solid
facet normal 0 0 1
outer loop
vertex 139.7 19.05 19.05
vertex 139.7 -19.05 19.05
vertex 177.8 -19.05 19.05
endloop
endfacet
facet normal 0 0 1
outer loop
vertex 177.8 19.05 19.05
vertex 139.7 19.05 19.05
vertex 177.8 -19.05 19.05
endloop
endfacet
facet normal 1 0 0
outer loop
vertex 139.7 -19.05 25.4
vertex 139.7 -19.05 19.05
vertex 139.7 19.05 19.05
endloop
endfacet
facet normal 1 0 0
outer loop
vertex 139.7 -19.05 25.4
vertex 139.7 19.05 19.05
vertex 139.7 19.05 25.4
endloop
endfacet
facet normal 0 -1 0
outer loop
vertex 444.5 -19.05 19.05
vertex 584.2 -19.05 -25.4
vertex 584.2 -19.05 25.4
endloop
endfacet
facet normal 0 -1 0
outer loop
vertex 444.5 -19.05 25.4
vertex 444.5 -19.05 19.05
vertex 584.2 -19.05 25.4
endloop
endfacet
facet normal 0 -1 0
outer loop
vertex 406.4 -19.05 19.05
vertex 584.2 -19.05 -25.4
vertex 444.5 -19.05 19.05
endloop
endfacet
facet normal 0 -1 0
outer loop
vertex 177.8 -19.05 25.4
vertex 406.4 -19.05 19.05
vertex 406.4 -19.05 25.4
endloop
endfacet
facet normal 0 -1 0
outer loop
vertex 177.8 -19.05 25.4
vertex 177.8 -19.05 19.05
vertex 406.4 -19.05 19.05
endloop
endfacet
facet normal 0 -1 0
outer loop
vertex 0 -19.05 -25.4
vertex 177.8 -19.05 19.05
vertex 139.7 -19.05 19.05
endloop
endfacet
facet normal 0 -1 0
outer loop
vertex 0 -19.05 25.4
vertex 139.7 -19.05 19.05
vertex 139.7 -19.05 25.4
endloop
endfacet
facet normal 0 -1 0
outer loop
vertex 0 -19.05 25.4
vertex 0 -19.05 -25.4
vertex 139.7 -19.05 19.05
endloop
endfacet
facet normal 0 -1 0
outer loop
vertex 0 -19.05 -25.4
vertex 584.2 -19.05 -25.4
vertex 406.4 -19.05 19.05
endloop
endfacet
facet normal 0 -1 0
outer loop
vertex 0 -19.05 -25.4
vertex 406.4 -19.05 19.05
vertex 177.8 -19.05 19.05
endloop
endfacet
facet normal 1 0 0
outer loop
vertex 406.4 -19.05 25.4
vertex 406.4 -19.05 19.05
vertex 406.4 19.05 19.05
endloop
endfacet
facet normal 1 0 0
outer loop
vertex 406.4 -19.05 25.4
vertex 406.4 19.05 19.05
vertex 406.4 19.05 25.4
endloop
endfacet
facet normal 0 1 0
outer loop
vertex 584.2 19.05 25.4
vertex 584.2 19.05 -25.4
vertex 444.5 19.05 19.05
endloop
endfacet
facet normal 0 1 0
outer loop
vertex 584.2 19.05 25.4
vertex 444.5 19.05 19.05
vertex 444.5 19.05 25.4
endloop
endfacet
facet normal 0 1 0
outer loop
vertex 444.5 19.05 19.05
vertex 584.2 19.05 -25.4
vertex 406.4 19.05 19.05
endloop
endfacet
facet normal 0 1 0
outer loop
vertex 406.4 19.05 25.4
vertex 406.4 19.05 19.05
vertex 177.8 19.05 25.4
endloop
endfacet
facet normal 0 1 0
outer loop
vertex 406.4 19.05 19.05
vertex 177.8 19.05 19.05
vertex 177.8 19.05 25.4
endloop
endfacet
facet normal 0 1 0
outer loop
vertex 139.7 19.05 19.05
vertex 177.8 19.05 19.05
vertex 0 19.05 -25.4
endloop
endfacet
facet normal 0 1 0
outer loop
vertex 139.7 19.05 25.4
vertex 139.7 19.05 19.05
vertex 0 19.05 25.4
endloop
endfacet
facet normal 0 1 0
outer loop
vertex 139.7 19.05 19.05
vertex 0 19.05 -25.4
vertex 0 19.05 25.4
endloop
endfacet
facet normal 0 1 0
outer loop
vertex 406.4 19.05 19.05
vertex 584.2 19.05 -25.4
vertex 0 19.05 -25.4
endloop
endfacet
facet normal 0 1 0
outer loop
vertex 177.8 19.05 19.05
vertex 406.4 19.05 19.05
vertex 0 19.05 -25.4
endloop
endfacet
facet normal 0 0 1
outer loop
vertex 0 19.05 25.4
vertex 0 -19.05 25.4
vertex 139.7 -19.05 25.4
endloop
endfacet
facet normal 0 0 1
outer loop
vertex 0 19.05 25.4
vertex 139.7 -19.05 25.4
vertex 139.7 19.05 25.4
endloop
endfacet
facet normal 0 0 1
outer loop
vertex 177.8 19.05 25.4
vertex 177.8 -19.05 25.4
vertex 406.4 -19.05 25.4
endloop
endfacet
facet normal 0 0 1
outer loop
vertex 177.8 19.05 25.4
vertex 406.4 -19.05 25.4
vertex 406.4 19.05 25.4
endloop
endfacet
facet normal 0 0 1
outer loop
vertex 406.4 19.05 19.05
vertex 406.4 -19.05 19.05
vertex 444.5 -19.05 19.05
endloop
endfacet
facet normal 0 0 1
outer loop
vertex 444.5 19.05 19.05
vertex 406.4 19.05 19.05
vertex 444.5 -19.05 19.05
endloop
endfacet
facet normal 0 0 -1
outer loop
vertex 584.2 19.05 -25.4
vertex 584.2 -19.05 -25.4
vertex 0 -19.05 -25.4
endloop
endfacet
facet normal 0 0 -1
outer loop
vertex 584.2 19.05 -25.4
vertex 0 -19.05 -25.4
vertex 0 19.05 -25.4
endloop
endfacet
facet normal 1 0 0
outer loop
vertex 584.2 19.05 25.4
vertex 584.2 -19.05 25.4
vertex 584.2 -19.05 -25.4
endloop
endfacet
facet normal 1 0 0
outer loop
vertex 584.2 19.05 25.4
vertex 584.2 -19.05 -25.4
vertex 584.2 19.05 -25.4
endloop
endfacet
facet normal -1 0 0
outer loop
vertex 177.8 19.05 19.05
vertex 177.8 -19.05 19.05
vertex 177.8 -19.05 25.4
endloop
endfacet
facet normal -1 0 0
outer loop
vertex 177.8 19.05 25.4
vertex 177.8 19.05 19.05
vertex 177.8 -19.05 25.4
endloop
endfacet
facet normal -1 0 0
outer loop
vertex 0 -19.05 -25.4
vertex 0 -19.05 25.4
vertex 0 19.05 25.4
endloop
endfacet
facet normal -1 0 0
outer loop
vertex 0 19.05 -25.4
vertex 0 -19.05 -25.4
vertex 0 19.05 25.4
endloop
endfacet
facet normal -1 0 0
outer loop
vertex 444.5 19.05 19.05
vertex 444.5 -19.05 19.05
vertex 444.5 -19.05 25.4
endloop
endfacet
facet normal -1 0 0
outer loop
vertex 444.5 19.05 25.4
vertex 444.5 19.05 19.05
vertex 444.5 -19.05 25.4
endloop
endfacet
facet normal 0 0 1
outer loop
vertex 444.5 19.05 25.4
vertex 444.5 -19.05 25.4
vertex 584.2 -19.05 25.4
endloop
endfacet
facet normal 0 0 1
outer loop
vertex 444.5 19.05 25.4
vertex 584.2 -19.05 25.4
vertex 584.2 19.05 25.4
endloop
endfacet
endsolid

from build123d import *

# Parameters (mm, degrees)
F0_W     = 38.1
F0_H     = 50.8
F1_DEPTH = 584.2
F2_W     = 38.1
F2_H     = 6.35
F3_DEPTH = 38.1


with BuildPart() as f1:
    # F0 (on Right) → F1 (new body)
    with BuildSketch(Plane.YZ):
        Rectangle(F0_W, F0_H)
    extrude(amount=F1_DEPTH)

    # F2 (on face) → F3 (cut, through all)
    with BuildSketch(Plane.XZ.offset(19.05)):
        with Locations((158.75, 22.225)):
            Rectangle(F2_W, F2_H)
        with Locations((425.45, 22.225)):
            Rectangle(F2_W, F2_H)
    extrude(amount=-F3_DEPTH, mode=Mode.SUBTRACT)


solid = f1.part
